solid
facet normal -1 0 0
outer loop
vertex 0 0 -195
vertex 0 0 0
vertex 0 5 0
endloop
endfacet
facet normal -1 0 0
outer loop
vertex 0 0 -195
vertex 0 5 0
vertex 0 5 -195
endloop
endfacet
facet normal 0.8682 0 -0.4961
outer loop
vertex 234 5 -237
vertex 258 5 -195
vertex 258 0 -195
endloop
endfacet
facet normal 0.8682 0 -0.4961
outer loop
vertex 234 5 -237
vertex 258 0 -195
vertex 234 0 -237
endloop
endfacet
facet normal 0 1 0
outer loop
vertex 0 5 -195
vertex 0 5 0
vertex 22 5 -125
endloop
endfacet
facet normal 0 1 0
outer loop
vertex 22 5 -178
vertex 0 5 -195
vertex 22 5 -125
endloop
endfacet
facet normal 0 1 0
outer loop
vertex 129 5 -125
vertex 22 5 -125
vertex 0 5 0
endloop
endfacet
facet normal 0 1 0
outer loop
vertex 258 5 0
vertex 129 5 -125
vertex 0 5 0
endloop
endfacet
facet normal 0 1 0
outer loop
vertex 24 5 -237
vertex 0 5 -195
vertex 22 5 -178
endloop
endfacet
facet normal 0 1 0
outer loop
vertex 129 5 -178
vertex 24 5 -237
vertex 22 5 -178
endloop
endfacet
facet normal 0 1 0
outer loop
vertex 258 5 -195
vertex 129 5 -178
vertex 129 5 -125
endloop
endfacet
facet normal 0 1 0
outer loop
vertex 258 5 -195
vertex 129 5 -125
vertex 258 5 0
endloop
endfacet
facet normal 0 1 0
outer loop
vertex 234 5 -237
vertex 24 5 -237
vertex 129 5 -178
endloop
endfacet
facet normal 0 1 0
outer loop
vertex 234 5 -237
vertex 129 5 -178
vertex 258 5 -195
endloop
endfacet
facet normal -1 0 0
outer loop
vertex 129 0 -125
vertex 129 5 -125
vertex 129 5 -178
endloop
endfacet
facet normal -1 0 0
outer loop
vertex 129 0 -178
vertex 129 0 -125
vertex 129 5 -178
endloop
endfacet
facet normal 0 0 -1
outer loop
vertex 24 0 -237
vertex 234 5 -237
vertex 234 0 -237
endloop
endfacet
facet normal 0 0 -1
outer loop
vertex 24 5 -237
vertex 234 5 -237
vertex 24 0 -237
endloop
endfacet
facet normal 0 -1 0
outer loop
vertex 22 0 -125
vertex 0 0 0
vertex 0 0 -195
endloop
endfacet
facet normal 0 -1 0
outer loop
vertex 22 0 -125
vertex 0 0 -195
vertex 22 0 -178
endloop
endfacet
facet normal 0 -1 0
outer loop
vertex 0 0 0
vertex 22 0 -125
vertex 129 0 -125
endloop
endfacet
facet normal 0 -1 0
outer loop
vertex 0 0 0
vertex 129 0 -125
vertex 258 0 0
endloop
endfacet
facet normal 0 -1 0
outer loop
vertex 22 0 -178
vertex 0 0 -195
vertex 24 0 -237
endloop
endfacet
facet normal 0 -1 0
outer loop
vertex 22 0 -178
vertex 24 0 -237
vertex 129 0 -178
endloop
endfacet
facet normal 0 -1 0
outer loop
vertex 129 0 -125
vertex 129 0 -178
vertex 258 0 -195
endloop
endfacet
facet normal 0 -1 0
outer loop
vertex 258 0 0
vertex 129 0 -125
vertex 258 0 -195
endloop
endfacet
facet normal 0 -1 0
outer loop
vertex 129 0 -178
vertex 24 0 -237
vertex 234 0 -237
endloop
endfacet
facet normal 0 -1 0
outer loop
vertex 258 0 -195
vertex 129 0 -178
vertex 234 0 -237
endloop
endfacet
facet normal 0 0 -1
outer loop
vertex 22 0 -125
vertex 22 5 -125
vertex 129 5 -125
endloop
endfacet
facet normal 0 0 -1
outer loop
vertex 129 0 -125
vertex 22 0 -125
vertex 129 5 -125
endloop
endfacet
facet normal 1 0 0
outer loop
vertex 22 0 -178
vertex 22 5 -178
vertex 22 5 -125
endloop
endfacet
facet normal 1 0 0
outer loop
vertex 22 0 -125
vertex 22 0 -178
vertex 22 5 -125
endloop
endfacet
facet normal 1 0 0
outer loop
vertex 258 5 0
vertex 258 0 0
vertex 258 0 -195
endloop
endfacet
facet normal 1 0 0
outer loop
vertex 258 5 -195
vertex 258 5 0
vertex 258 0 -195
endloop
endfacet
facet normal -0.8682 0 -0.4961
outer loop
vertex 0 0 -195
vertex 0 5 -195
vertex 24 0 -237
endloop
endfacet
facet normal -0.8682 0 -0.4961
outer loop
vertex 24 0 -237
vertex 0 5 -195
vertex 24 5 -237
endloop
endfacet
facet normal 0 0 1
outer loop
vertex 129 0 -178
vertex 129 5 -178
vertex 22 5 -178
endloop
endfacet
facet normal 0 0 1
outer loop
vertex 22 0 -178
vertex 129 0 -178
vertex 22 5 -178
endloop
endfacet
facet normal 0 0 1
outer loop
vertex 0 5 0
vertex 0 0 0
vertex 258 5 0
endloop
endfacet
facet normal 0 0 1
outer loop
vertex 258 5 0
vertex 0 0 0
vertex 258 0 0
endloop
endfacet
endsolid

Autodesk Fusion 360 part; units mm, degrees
sketch "Skizze1" plane through (0, 0, 0) normal (0, 1, 0) x (1, 0, 0)
  line L0 (0, 0) -> (258, 0)
  line L1 (258, 0) -> (258, 237)
  line L2 (0, 0) -> (0, 185)
  line L3 (0, 185) -> (258, 185)
  line L4 (258, 237) -> (0, 237)
  line L5 (0, 237) -> (0, 185)
  line L6 (0, 185) -> (24.5, 185)
  line L7 (258, 185) -> (233.5, 185)
  line L8 (24.5, 237) -> (233.5, 237)
  line L9 (0, 185) -> (24.5, 237)
  line L10 (258, 185) -> (233.5, 237)
  dimension "d1" = 258
  dimension "d2" = 237
  dimension "d3" = 185
  dimension "d4" = 24.5
  dimension "d5" = 24.5
  dimension "d6" = 209
extrude "Extrusion1" add sketch "Skizze1" along normal blind 5 contours L0 L1 L2 L3 L6 L7 | L3 L4 L6 L7 L8 L9 L10
sketch "Skizze2" plane through (0, 5, 0) normal (0, 1, 0) x (-1, 0, 0)
  line L0 (0, 0) -> (-258, 0)
  line L1 (-258, 0) -> (-258, -185)
  line L2 (-258, -185) -> (-233.5, -237)
  line L3 (-233.5, -237) -> (-24.5, -237)
  line L4 (-24.5, -237) -> (0, -185)
  line L5 (0, -185) -> (0, 0)
  line L6 (0, -185) -> (-258, -185)
  line L7 (0, 0) -> (0, -125)
  line L8 (0, -125) -> (-22, -125)
  line L9 (-22, -125) -> (-129, -125)
  line L10 (-129, -125) -> (-129, -178)
  line L11 (-129, -178) -> (-22, -178)
  line L12 (-22, -178) -> (-22, -125)
  dimension "d9" = 125
  dimension "d10" = 22
  dimension "d11" = 107
  dimension "d12" = 53
extrude "Extrusion2" cut sketch "Skizze2" against normal blind 50 contours L9 L10 L11 L12
sketch "Skizze3" plane through (0, 5, 0) normal (0, 1, 0) x (-1, 0, 0)
  line L0 (-129, -125) -> (-22, -125)
  line L1 (-22, -125) -> (-22, -178)
  line L2 (-22, -178) -> (-129, -178)
  line L3 (-129, -178) -> (-129, -125)
  line L4 (0, 0) -> (-258, 0)
  line L5 (-258, 0) -> (-258, -185)
  line L6 (-258, -185) -> (-233.5, -237)
  line L7 (-233.5, -237) -> (-24.5, -237)
  line L8 (-24.5, -237) -> (0, -185)
  line L9 (0, -185) -> (0, 0)
  line L10 (0, -185) -> (-30.8644, -237)
  line L11 (-258, -185) -> (-230, -237)
extrude "Extrusion3" cut sketch "Skizze3" against normal blind 30 contours L7 L8 L10 | L6 L7 L11
sketch "Skizze4" plane through (0, 5, 0) normal (0, 1, 0) x (-1, 0, 0)
  line L0 (-30.8644, -237) -> (0, -185)
  line L1 (0, -185) -> (0, 0)
  line L2 (0, 0) -> (-258, 0)
  line L3 (-258, 0) -> (-258, -185)
  line L4 (-258, -185) -> (-230, -237)
  line L5 (-230, -237) -> (-30.8644, -237)
  line L6 (-129, -125) -> (-22, -125)
  line L7 (-22, -125) -> (-22, -178)
  line L8 (-22, -178) -> (-129, -178)
  line L9 (-129, -178) -> (-129, -125)
  line L10 (-30.8644, -237) -> (0, -237)
  line L11 (0, -237) -> (0, -185)
  line L12 (-258, -185) -> (-258, -237)
  line L13 (-258, -237) -> (-230, -237)
extrude "Extrusion4" add sketch "Skizze4" against normal blind 5 contours L0 L10 L11 | L4 L12 L13
sketch "Skizze5" plane through (0, 5, 0) normal (0, 1, 0) x (-1, 0, 0)
  line L0 (0, -237) -> (0, 0)
  line L1 (0, 0) -> (-258, 0)
  line L2 (-258, 0) -> (-258, -237)
  line L3 (-258, -237) -> (-230, -237)
  line L4 (-230, -237) -> (0, -237)
  line L5 (-129, -125) -> (-22, -125)
  line L6 (-22, -125) -> (-22, -178)
  line L7 (-22, -178) -> (-129, -178)
  line L8 (-129, -178) -> (-129, -125)
  line L9 (0, -237) -> (-24, -237)
  line L10 (-258, -237) -> (-234, -237)
  line L11 (0, -237) -> (0, -187)
  line L12 (-258, -237) -> (-258, -187)
  line L13 (0, -187) -> (-24, -237)
  line L14 (-258, -187) -> (-234, -237)
  dimension "d19" = 24
  dimension "d20" = 24
  dimension "d21" = 50
  dimension "d22" = 50
extrude "Extrusion5" cut sketch "Skizze5" against normal blind 45 contours L0 L4 L9 L11 L13 | L2 L3 L10 L12 L14
sketch "Skizze6" plane through (0, 5, 0) normal (0, 1, 0) x (-1, 0, 0)
  line L0 (-24, -237) -> (0, -187)
  line L1 (0, -187) -> (0, 0)
  line L2 (0, 0) -> (-258, 0)
  line L3 (-258, 0) -> (-258, -187)
  line L4 (-258, -187) -> (-234, -237)
  line L5 (-234, -237) -> (-230, -237)
  line L6 (-230, -237) -> (-24, -237)
  line L7 (-129, -125) -> (-22, -125)
  line L8 (-22, -125) -> (-22, -178)
  line L9 (-22, -178) -> (-129, -178)
  line L10 (-129, -178) -> (-129, -125)
  line L11 (0, 0) -> (0, -195)
  line L12 (-258, 0) -> (-258, -195)
  line L13 (0, -195) -> (-24, -237)
  line L14 (-258, -195) -> (-234, -237)
  dimension "d25" = 195
  dimension "d26" = 195
extrude "Extrusion6" add sketch "Skizze6" against normal blind 5 contours L0 L11 L13 | L4 L12 L14
